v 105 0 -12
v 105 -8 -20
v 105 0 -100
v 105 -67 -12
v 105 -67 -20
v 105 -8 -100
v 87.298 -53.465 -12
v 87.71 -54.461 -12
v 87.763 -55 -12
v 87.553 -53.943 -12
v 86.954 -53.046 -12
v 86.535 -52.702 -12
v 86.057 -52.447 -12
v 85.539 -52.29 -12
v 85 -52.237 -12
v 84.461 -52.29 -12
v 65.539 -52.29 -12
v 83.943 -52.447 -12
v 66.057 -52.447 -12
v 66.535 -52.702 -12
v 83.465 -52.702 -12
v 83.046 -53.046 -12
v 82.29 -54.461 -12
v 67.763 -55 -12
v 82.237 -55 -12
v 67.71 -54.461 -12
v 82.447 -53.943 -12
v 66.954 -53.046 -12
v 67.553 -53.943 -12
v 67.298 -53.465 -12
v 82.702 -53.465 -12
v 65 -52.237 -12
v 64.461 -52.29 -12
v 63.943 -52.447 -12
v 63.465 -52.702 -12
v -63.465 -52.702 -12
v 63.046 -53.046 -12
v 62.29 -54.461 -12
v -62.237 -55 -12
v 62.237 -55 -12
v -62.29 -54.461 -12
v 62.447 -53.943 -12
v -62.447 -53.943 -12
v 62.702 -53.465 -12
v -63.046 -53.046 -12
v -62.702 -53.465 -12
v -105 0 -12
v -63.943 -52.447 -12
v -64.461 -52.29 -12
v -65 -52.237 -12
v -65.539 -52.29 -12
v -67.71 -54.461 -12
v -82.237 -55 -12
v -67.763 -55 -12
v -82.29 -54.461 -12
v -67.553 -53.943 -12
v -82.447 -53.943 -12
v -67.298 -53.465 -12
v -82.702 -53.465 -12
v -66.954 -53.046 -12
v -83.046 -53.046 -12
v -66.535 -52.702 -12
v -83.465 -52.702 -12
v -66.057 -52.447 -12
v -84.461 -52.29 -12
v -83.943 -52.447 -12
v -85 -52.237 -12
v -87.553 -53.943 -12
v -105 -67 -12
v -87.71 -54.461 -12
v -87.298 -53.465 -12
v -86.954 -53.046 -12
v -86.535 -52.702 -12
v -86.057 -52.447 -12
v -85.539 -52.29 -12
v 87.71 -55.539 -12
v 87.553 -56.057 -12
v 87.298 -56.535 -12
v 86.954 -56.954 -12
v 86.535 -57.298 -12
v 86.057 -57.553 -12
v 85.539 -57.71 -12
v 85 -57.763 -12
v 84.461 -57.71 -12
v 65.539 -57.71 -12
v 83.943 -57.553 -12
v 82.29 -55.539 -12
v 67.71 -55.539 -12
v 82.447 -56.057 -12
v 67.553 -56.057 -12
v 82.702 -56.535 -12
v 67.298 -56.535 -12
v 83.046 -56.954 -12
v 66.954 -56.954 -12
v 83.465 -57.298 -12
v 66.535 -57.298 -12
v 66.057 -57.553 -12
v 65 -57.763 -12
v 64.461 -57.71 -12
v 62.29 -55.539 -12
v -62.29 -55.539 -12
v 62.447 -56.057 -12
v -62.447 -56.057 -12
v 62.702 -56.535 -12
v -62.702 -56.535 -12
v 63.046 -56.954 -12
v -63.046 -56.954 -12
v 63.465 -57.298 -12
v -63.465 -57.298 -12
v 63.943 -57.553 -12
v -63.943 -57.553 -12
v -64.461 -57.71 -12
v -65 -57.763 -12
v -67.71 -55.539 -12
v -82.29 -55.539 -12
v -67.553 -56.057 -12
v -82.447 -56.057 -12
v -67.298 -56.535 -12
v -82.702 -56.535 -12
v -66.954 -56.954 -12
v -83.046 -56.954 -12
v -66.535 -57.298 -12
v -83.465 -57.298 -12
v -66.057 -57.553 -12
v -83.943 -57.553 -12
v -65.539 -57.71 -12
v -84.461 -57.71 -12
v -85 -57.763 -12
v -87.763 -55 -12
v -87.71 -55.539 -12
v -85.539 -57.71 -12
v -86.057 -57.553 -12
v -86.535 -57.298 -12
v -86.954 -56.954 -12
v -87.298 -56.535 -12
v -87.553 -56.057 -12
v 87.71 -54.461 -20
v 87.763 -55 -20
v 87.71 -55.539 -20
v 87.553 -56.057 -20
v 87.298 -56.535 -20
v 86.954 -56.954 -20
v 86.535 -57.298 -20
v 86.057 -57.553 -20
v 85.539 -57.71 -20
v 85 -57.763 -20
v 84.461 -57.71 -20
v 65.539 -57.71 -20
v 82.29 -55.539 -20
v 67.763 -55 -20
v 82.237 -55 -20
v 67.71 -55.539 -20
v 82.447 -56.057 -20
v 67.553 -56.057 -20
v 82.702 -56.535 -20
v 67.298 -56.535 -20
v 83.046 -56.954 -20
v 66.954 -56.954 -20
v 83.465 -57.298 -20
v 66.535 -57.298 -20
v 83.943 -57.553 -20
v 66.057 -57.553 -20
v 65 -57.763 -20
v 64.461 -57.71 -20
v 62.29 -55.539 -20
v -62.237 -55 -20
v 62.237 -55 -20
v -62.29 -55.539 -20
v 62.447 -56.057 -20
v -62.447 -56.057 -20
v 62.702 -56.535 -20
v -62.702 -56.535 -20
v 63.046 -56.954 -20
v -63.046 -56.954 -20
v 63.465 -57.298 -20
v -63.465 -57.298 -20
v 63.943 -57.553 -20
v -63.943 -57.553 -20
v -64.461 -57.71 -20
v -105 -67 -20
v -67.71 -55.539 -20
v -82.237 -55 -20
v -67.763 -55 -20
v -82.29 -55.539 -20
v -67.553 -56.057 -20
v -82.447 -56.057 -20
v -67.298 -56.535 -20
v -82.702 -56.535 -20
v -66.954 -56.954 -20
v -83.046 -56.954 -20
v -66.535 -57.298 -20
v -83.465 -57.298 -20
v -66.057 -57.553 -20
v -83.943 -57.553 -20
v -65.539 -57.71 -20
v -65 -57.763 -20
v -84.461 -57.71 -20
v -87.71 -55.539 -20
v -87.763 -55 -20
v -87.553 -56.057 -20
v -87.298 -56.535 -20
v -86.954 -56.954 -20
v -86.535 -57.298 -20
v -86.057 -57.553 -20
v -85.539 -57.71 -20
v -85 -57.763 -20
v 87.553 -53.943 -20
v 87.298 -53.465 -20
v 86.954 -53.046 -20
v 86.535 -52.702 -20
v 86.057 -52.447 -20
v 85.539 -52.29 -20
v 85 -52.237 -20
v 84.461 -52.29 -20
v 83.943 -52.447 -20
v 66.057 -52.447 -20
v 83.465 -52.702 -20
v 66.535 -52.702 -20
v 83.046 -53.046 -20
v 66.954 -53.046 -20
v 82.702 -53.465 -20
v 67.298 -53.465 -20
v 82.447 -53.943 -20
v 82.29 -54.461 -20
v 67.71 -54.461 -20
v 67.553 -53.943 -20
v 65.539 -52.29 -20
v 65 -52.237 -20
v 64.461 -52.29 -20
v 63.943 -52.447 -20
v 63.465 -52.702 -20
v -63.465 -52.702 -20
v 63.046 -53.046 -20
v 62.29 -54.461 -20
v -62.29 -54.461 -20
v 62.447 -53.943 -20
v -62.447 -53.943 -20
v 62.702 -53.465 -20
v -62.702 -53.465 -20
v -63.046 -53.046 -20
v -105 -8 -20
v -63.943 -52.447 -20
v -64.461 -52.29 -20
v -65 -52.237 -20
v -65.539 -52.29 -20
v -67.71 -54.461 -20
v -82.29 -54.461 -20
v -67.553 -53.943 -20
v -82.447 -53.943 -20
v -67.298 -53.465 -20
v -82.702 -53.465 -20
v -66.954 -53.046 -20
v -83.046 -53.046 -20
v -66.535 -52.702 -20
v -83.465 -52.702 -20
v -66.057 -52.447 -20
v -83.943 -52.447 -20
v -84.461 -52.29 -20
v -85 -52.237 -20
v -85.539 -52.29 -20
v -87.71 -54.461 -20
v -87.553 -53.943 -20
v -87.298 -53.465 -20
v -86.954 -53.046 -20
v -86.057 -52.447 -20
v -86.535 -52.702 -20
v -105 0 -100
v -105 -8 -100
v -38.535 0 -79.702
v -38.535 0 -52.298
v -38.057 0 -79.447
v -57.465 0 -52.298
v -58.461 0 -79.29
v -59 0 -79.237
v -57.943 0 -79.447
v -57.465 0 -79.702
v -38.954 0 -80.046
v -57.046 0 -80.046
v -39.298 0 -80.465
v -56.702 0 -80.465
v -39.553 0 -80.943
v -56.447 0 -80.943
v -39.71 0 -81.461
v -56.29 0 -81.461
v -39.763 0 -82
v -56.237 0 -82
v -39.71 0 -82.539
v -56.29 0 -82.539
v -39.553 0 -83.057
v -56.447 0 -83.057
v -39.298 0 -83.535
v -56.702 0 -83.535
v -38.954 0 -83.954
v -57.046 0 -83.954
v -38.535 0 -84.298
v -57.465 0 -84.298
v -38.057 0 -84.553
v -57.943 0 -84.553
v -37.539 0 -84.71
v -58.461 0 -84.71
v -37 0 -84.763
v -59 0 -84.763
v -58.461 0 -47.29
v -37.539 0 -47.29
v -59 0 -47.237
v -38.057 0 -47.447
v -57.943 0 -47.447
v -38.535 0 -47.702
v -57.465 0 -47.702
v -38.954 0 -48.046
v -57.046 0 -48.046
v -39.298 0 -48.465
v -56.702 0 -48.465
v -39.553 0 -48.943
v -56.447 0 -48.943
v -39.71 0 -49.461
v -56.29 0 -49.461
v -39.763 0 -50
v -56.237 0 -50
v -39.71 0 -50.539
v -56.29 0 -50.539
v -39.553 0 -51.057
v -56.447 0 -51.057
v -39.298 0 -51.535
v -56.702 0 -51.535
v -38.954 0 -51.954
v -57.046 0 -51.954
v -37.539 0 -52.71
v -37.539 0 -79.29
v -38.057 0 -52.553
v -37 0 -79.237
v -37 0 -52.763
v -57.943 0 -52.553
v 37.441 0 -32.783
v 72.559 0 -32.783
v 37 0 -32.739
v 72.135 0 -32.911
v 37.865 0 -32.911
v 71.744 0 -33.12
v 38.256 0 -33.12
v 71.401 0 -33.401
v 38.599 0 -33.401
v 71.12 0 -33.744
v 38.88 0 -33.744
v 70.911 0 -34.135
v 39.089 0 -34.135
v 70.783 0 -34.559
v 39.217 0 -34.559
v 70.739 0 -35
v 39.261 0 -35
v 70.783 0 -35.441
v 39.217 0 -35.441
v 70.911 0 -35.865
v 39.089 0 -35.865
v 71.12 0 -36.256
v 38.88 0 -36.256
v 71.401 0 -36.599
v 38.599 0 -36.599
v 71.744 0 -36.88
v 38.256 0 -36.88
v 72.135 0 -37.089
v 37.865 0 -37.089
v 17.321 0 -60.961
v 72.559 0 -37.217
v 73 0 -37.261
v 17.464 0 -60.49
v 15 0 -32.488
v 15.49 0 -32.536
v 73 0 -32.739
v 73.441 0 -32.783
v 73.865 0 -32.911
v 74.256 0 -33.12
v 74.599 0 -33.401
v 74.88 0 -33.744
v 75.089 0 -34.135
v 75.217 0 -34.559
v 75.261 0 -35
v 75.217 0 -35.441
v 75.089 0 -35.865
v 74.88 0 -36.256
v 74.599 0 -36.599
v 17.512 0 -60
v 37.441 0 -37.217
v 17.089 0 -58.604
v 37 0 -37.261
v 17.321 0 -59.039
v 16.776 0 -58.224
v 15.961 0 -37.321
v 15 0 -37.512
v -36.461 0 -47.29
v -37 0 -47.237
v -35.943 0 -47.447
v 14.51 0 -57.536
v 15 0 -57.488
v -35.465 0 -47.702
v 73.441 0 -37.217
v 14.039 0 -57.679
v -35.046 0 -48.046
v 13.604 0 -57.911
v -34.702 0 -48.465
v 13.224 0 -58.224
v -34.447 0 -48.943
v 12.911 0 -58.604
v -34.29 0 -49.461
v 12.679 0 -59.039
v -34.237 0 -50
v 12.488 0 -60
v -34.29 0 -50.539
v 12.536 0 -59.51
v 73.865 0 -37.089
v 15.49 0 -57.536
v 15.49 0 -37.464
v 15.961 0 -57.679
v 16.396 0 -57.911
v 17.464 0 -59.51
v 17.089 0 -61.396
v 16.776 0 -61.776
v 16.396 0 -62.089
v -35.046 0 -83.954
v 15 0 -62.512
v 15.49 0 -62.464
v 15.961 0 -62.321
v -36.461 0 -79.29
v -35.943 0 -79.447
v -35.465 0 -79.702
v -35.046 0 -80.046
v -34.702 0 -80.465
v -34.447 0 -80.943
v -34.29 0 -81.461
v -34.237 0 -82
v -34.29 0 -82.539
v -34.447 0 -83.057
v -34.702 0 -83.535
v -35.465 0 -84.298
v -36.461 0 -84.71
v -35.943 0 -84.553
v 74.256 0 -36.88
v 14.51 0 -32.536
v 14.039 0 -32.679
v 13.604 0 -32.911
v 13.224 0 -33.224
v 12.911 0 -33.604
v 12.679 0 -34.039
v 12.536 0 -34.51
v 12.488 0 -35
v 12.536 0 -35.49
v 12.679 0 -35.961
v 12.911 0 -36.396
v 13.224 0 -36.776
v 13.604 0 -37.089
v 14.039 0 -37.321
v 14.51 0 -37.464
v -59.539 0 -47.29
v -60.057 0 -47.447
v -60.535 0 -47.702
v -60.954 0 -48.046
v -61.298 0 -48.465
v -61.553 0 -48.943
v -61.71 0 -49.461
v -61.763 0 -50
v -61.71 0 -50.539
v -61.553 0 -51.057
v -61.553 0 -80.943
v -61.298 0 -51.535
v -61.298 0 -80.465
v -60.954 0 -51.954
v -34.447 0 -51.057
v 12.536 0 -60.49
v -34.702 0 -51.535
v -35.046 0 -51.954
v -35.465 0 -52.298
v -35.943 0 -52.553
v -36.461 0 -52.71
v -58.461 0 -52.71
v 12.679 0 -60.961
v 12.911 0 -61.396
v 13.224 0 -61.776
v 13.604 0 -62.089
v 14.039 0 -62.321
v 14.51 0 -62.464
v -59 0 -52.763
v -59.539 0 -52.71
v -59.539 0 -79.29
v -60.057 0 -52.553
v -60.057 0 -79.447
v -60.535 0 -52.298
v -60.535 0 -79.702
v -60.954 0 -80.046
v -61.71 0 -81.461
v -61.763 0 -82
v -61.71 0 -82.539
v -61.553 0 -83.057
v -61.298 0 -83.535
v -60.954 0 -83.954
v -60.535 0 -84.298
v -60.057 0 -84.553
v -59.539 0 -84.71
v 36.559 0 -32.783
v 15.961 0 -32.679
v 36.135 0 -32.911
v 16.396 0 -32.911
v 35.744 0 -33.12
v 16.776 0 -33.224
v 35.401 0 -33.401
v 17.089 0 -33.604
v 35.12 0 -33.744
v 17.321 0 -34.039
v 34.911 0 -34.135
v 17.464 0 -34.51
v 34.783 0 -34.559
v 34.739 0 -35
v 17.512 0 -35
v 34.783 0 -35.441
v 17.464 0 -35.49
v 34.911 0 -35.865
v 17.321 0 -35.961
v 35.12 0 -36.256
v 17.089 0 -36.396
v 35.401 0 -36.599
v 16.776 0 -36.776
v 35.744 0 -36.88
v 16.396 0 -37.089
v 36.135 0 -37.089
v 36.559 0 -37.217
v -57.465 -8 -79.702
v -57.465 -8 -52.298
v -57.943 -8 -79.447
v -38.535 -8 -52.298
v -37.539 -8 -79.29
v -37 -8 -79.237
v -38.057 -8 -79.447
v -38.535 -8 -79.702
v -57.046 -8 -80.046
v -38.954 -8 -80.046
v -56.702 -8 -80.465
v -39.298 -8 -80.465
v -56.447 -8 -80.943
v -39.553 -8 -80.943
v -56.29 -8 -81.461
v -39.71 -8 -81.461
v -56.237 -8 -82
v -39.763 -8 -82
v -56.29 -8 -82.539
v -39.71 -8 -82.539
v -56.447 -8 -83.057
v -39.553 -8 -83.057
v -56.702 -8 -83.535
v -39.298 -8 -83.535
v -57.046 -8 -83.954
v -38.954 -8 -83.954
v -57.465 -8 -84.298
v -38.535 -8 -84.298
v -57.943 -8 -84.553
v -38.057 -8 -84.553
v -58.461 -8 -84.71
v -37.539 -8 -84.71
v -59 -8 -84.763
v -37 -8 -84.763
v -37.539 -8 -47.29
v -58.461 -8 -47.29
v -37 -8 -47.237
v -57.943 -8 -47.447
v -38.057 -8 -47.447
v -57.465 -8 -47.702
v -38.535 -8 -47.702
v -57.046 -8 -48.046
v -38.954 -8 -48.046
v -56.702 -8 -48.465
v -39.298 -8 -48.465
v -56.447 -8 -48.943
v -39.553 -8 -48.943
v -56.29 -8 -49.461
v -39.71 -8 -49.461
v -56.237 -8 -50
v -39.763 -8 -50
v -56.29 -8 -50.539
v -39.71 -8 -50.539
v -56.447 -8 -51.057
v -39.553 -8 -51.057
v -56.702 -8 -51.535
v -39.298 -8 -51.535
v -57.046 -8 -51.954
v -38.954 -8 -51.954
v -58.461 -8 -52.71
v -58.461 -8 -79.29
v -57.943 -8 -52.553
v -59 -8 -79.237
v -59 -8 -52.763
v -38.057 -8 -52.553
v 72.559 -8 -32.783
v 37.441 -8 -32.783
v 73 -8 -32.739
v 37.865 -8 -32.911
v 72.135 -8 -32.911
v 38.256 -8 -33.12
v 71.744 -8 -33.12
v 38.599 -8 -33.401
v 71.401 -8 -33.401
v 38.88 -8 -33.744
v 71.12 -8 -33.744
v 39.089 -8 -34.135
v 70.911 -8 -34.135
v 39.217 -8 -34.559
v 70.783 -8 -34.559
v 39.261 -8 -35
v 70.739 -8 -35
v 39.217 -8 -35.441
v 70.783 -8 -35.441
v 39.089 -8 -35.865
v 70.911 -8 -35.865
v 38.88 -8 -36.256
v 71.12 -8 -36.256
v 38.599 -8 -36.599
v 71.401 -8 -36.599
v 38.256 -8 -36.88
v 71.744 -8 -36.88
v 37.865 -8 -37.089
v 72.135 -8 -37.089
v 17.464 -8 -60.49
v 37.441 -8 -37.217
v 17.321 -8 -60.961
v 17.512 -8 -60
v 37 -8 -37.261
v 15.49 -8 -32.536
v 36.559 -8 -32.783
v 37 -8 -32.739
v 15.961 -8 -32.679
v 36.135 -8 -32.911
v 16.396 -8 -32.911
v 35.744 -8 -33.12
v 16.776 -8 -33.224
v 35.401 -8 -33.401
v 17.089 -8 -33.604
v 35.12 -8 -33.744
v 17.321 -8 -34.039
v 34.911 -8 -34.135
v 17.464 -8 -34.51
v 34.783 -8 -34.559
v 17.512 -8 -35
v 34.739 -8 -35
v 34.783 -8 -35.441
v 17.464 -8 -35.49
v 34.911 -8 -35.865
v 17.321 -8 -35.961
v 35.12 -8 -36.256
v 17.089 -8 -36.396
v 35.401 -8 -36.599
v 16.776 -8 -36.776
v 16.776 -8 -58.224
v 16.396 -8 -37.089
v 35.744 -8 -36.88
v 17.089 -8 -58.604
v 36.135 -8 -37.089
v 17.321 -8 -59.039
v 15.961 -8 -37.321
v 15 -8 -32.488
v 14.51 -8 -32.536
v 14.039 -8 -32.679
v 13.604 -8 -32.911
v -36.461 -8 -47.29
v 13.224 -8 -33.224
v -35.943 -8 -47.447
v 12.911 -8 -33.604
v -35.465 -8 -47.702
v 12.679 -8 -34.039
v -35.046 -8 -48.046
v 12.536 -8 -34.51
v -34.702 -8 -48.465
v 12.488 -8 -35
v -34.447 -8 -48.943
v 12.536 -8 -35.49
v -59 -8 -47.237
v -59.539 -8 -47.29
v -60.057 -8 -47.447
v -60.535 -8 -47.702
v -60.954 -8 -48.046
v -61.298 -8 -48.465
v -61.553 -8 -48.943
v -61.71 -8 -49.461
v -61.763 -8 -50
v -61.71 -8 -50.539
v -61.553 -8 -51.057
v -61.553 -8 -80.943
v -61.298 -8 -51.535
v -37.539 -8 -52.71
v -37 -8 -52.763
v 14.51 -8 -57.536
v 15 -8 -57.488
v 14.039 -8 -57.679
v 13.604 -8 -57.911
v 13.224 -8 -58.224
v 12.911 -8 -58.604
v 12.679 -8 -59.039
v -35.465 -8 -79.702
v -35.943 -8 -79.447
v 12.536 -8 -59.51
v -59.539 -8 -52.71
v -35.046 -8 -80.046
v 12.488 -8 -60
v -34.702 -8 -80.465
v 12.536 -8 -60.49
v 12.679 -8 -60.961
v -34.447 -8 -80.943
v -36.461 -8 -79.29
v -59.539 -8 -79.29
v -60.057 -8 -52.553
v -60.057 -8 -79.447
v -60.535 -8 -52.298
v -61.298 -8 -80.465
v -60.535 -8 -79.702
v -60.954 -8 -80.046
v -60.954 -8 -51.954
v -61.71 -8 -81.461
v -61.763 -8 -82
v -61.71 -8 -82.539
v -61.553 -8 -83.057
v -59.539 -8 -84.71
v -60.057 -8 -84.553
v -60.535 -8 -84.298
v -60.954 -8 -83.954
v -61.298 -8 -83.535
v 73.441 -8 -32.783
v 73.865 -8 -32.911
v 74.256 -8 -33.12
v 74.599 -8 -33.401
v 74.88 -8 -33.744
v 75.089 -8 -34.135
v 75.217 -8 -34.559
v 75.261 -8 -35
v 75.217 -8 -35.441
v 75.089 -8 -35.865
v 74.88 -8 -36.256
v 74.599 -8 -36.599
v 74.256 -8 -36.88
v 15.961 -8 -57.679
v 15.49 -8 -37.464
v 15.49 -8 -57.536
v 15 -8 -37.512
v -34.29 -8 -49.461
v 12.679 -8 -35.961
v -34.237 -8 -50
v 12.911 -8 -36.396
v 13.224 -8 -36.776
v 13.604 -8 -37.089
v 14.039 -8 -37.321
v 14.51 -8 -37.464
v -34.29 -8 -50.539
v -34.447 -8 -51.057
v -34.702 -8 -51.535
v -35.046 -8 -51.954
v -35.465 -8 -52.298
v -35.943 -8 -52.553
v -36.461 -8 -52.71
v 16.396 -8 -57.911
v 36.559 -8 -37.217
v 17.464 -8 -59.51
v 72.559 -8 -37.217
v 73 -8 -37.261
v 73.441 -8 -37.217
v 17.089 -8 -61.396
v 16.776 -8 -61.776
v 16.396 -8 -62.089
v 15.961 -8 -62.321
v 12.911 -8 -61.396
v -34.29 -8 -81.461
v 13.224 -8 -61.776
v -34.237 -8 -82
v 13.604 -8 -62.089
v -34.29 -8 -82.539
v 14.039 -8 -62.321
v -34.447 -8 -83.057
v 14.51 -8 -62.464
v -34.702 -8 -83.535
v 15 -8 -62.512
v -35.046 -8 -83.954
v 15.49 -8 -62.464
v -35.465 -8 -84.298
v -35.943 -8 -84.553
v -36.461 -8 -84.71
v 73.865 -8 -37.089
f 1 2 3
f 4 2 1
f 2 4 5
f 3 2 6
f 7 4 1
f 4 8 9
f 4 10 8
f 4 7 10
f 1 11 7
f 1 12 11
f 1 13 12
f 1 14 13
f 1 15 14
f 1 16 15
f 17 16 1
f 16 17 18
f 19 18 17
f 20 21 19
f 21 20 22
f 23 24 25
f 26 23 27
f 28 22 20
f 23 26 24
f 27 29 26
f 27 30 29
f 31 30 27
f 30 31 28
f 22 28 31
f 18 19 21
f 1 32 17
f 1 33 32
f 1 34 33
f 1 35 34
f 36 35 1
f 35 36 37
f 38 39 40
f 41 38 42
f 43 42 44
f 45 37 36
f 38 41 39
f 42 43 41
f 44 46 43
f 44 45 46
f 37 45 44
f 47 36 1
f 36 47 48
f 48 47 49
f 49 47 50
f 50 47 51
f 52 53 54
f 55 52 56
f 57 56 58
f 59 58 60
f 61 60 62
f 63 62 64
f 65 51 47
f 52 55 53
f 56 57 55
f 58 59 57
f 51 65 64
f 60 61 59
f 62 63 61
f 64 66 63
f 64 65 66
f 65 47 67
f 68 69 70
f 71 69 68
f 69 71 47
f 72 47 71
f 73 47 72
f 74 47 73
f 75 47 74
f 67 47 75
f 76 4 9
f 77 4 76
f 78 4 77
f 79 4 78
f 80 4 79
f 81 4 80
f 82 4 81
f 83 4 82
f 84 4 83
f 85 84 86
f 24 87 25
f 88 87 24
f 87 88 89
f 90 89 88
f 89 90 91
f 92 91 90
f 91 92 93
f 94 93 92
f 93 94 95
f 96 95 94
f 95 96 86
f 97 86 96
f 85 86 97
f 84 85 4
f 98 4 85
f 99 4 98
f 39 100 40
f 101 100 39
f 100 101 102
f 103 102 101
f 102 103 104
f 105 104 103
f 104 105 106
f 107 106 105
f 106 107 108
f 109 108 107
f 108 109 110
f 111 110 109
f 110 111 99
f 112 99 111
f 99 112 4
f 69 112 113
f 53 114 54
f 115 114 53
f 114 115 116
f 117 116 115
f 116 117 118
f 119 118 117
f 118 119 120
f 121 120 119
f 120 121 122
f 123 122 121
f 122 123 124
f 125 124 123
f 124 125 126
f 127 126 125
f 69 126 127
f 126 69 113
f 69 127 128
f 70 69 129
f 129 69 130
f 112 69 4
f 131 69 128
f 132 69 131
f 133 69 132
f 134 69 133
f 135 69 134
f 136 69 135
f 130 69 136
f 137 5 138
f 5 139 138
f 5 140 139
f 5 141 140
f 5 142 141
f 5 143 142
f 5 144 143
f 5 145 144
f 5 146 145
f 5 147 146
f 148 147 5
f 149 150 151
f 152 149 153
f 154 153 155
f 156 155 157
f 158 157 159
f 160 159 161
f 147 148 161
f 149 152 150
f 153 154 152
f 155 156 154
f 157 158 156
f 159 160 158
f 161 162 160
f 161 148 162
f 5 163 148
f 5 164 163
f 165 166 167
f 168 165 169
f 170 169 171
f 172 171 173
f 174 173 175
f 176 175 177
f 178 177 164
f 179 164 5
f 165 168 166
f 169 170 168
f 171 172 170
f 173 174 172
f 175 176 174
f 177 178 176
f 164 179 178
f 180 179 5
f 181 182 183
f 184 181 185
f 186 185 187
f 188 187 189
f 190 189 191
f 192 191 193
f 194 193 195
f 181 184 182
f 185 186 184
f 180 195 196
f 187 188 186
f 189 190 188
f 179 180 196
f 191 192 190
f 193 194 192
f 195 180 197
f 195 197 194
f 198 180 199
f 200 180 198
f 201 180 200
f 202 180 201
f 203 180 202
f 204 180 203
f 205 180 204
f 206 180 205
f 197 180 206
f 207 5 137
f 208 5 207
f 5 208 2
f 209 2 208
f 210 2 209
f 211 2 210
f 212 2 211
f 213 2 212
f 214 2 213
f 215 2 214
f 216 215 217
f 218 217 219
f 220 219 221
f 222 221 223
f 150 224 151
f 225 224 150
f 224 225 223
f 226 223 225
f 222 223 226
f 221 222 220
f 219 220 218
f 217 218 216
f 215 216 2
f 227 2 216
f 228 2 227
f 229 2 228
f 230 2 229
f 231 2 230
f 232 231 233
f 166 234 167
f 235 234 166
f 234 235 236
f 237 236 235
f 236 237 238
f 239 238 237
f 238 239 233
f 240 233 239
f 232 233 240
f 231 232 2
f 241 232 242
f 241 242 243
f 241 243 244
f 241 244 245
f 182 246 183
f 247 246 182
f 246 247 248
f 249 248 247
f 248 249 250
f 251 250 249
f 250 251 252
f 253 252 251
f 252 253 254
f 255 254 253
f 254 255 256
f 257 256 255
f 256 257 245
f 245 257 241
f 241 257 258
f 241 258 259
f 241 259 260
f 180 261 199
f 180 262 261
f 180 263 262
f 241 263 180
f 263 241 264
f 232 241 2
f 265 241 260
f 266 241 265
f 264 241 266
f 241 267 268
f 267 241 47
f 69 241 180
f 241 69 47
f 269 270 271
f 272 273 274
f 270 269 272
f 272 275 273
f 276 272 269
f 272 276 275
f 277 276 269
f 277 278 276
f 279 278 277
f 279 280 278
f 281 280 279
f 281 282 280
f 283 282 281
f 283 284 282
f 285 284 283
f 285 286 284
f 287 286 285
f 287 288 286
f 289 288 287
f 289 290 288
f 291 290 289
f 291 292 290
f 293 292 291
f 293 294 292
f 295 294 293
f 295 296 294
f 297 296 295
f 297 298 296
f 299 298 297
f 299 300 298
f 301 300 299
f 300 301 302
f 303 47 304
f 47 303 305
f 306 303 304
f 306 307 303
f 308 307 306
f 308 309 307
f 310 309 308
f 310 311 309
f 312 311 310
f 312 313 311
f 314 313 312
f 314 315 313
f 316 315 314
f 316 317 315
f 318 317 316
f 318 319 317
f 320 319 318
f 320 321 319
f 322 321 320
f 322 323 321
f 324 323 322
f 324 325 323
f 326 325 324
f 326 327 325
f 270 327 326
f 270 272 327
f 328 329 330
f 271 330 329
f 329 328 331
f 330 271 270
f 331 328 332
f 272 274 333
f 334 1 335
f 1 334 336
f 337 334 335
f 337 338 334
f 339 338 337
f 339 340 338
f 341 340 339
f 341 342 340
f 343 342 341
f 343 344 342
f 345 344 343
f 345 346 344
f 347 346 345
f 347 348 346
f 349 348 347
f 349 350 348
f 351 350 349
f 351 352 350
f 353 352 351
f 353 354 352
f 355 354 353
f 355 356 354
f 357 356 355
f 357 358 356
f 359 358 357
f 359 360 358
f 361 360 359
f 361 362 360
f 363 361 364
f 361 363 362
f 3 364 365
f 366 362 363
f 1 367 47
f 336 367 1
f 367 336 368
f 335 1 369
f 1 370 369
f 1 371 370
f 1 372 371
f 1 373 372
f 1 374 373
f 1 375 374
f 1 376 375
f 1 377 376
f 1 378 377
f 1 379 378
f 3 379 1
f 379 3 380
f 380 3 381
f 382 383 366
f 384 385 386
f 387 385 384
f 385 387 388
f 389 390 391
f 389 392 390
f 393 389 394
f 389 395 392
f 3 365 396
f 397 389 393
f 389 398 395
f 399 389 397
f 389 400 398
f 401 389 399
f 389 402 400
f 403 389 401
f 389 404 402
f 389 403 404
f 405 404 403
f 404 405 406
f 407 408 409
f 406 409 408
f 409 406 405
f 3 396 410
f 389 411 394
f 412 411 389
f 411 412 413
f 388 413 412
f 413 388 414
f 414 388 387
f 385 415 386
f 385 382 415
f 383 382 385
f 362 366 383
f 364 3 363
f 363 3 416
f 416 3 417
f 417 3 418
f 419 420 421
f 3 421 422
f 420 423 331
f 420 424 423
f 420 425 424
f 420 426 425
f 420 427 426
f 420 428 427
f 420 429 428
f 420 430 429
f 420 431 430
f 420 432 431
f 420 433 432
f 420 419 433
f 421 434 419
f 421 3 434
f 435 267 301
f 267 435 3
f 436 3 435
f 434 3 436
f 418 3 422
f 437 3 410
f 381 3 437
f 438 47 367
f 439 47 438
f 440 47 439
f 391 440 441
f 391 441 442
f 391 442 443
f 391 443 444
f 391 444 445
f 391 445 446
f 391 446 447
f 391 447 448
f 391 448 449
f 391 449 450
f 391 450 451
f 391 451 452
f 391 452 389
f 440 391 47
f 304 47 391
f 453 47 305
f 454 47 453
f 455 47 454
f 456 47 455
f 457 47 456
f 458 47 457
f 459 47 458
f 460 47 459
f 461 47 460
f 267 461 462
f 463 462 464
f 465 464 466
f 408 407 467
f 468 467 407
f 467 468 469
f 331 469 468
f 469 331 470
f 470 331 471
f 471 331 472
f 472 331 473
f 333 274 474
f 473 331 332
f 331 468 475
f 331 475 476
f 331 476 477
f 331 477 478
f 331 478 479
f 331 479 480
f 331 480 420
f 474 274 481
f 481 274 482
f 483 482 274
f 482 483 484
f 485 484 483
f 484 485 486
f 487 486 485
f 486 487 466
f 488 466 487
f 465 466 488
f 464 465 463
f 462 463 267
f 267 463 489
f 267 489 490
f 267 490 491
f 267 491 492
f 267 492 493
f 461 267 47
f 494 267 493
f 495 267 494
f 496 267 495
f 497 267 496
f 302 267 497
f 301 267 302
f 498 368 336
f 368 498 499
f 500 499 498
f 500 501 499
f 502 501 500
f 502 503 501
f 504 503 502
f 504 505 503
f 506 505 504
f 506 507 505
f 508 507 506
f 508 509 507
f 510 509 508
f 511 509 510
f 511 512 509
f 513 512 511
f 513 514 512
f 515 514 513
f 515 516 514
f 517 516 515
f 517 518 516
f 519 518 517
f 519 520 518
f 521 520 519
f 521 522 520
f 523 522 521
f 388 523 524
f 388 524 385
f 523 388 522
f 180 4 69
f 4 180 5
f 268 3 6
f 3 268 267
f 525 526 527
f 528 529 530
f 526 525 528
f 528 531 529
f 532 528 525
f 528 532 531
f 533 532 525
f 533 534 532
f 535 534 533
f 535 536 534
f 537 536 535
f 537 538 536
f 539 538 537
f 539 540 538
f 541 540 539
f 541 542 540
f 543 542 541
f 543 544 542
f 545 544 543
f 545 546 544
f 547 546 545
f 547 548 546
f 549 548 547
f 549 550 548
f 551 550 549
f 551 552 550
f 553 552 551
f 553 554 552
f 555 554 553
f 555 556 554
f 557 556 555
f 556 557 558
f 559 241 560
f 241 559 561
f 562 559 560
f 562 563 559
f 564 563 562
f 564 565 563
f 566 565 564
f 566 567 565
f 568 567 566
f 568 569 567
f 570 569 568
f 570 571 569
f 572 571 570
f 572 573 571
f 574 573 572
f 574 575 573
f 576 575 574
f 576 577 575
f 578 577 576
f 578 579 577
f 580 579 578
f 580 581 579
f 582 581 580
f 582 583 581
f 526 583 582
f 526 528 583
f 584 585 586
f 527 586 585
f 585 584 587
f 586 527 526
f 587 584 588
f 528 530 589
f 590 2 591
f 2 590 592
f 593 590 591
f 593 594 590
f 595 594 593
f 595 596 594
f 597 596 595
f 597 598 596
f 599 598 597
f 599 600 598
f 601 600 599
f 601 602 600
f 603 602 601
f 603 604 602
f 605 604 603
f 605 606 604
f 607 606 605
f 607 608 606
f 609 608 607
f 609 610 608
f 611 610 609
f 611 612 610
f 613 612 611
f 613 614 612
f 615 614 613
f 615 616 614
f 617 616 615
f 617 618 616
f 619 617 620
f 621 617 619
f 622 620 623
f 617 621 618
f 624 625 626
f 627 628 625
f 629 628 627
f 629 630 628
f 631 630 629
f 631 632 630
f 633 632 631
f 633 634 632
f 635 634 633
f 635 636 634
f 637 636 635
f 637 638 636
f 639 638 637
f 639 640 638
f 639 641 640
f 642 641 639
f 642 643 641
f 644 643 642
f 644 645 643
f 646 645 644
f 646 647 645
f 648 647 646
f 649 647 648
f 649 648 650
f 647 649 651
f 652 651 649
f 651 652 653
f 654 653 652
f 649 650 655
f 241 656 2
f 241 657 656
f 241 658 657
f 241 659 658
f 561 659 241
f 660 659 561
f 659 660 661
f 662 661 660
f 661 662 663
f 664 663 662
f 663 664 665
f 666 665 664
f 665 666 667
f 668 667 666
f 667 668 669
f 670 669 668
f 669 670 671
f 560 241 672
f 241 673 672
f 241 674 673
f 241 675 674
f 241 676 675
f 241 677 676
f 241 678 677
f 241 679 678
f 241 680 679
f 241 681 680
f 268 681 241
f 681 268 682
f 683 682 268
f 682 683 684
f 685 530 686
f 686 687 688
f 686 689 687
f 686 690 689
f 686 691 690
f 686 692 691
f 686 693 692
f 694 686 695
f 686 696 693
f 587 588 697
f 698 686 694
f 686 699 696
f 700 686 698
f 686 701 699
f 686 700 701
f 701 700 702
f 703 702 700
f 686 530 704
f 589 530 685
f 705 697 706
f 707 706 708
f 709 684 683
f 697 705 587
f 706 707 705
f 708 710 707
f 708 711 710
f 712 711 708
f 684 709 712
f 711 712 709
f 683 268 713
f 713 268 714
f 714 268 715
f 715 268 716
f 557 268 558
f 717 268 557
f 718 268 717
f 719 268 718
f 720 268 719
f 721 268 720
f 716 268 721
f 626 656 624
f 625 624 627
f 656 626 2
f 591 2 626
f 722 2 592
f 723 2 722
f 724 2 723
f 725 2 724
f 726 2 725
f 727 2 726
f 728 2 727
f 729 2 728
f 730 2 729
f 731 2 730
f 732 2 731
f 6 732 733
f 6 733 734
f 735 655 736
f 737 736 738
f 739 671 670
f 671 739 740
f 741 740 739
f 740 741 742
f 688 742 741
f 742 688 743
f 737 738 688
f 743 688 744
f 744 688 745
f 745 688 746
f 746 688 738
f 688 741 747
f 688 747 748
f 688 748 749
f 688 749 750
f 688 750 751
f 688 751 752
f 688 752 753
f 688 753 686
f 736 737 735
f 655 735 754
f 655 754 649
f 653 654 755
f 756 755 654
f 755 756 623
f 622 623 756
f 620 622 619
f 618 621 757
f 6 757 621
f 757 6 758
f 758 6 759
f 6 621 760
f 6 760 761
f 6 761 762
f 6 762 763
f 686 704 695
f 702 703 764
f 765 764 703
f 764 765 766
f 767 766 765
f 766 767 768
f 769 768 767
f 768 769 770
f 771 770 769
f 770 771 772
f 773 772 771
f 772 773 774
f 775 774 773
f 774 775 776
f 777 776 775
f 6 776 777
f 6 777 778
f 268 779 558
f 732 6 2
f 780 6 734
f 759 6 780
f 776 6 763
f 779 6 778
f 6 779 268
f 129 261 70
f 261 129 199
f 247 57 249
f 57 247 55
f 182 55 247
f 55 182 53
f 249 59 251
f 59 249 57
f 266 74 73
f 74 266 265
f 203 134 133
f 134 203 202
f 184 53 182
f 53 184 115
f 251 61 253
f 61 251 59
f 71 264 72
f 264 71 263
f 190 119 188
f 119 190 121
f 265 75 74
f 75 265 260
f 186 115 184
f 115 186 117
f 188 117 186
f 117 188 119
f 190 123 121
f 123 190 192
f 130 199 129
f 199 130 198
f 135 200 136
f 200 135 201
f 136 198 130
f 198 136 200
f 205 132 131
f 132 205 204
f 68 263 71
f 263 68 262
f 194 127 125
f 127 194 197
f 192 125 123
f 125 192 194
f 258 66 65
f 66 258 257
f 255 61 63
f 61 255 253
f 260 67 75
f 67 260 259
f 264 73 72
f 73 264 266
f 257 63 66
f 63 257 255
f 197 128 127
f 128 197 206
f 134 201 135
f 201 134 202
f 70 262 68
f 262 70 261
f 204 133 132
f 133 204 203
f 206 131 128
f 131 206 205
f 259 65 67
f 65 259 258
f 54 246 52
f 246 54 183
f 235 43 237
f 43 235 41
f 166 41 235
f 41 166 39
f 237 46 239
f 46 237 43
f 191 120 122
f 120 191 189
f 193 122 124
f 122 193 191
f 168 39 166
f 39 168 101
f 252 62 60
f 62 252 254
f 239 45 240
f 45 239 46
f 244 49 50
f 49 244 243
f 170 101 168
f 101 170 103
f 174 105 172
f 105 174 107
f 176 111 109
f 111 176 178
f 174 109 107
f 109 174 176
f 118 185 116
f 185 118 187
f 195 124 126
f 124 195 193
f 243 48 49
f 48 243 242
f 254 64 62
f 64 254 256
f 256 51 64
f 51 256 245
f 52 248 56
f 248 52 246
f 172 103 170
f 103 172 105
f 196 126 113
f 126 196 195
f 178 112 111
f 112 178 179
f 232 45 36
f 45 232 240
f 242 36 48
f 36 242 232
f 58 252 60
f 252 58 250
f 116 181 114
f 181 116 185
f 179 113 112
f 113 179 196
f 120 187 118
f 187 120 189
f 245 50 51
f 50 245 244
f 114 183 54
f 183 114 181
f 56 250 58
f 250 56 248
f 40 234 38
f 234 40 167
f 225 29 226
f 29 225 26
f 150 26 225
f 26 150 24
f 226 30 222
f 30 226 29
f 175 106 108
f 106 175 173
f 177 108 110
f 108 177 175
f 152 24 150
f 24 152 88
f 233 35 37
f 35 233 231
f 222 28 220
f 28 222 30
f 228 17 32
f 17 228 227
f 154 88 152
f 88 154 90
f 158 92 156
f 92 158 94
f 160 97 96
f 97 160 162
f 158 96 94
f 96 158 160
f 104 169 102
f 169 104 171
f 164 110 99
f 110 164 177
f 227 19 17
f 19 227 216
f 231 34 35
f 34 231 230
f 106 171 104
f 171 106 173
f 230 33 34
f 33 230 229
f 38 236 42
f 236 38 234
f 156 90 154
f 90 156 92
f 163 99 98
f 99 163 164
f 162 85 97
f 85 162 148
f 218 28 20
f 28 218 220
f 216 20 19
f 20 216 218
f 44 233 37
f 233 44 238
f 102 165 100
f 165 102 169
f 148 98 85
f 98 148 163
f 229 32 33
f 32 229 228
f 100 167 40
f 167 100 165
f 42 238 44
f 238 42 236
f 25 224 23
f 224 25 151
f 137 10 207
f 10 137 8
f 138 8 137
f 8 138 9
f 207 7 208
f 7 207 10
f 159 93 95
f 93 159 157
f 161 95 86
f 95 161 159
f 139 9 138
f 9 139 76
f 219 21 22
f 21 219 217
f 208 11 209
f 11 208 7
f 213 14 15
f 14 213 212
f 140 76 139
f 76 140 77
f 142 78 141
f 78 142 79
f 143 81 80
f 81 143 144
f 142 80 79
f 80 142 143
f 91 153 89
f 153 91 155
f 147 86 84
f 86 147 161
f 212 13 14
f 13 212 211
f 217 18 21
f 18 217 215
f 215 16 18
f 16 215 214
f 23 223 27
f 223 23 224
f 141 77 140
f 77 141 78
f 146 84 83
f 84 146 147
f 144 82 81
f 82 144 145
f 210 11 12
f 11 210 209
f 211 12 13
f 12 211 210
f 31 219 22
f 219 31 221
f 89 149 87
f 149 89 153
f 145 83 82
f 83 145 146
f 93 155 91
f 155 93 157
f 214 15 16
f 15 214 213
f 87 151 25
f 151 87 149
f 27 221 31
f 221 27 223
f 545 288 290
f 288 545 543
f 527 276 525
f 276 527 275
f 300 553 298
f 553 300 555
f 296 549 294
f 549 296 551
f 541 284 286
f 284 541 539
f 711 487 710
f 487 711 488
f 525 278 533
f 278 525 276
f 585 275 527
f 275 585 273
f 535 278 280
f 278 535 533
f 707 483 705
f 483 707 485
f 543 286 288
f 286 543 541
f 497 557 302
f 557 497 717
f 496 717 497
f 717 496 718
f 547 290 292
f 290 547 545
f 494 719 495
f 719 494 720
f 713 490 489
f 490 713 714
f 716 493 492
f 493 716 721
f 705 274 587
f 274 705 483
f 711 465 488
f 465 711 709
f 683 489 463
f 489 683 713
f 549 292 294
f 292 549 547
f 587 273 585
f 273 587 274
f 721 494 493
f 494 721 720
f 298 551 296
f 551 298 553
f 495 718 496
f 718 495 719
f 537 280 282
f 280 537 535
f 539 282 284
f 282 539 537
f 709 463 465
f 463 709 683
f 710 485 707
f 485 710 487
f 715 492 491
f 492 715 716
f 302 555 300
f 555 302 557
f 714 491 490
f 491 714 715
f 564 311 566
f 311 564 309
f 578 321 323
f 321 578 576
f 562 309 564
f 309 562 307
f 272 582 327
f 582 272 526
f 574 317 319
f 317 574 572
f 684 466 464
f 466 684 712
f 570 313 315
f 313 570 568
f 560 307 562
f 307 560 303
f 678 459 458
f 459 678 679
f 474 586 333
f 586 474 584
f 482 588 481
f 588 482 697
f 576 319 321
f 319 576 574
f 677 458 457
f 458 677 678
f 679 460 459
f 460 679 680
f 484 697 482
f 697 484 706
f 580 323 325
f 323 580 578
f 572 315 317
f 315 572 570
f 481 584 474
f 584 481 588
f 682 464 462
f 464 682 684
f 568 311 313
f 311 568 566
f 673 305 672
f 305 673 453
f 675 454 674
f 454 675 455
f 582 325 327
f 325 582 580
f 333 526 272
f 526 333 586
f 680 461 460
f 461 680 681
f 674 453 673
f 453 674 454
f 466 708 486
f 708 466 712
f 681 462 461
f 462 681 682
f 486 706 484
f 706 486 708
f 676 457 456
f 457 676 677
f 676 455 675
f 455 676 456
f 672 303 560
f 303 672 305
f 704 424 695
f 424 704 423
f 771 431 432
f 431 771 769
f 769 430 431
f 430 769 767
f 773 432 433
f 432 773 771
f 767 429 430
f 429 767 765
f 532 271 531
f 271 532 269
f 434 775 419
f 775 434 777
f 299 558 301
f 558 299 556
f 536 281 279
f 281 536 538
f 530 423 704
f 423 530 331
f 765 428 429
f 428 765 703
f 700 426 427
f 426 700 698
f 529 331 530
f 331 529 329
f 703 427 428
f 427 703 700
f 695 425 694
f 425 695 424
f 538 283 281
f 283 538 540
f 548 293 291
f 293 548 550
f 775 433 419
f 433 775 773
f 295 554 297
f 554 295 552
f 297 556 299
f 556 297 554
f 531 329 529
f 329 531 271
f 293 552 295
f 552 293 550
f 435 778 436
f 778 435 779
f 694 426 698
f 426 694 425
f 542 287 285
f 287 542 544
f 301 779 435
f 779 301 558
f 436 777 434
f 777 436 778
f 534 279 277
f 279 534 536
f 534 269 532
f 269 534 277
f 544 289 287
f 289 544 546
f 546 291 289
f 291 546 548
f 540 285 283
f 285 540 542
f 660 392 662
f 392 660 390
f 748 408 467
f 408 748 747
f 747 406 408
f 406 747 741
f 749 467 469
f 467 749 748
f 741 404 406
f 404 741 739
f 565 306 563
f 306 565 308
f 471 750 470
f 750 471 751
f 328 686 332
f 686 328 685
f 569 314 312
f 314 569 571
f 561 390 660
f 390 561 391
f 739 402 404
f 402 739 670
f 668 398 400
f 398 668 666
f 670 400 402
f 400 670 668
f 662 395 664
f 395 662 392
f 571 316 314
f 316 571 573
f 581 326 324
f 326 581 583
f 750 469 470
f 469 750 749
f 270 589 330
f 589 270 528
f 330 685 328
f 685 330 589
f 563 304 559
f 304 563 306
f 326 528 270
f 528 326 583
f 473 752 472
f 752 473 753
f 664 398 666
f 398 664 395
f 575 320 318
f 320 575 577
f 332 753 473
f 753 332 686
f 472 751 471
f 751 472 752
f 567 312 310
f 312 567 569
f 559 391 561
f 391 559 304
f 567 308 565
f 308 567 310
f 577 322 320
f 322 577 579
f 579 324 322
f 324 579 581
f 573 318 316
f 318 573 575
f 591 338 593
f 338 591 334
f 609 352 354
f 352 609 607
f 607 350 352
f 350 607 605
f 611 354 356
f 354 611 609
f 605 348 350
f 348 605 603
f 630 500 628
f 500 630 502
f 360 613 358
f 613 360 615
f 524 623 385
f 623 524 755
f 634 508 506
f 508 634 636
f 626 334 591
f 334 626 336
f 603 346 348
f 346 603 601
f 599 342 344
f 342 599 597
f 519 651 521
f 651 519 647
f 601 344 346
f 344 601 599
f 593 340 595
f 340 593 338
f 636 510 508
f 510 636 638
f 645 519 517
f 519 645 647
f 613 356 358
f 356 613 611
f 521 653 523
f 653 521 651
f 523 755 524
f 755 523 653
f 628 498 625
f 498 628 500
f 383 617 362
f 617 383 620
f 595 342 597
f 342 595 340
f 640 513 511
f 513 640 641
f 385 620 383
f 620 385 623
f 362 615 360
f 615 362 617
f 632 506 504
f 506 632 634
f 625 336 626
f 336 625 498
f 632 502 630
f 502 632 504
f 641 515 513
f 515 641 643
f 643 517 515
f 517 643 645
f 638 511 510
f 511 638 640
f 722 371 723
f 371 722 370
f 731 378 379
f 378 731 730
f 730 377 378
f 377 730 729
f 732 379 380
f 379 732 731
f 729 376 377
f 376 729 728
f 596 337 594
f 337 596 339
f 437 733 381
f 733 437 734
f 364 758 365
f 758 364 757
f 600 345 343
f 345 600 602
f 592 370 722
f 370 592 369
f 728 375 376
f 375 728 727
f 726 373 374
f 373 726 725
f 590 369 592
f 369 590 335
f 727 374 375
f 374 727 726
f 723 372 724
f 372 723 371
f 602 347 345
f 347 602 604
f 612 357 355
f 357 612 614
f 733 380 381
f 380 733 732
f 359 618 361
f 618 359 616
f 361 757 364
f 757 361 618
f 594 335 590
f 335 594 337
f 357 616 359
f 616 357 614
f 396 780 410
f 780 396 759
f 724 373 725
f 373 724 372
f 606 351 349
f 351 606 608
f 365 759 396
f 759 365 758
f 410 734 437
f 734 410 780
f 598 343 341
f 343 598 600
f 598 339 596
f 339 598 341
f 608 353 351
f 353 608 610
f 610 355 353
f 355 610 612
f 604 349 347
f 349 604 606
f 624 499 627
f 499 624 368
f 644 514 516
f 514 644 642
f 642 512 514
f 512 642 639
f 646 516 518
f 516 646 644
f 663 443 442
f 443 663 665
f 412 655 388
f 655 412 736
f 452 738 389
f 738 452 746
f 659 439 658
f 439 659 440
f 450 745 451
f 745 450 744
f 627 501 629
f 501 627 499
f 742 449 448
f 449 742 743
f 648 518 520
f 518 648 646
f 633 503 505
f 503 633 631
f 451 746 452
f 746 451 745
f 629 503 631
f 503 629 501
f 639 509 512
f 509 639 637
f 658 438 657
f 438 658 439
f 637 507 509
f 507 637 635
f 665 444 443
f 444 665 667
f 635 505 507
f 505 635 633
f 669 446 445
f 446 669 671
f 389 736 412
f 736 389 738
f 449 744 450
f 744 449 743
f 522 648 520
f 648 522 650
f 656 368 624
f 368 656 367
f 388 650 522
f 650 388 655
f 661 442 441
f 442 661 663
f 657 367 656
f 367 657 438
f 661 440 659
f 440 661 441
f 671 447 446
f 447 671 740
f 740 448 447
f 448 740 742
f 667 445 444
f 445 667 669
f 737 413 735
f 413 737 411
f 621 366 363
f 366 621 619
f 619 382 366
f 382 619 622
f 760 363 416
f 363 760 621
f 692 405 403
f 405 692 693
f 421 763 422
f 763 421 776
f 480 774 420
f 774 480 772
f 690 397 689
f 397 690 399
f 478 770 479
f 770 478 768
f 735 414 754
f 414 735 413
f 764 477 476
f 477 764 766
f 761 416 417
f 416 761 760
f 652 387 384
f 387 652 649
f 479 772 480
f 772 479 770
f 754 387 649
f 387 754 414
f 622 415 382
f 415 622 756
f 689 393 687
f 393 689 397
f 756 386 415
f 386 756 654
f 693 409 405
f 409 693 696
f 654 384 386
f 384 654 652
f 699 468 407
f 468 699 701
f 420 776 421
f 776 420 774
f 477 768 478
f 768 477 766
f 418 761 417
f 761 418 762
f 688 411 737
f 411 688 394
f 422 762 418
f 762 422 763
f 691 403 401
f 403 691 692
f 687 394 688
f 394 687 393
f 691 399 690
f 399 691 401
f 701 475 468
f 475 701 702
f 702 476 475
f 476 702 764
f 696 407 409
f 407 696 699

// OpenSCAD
// Compact L carrier: horizontal flange meets frame Z=-12; mounting face Y=0.
width=210; wall=8; rear_y=-67; top_z=-12; bottom_z=-100;
camera_x=-48; camera_z=-66; camera_pitch=[22,32];
td_x=55; td_z=-35; td_bolt_pitch=36;
frame_x=[-85,-65,65,85];
$fn=48;
module hole(d,h){cylinder(d=d/cos(180/32),h=h,$fn=32);}
module yh(d,h){rotate([-90,0,0])hole(d,h);}
assert(camera_z+camera_pitch[1]/2+5<top_z);
assert(camera_z-camera_pitch[1]/2-5>bottom_z);
assert(td_x+td_bolt_pitch/2+5<width/2);
difference(){
 union(){
  translate([-width/2,rear_y,top_z-wall])cube([width,-rear_y,wall]);
  translate([-width/2,-wall,bottom_z])cube([width,wall,top_z-bottom_z]);
 }
 for(x=frame_x)translate([x,-55,top_z-wall-.02])hole(5.5,wall+.04);
 for(x=[-camera_pitch[0]/2,camera_pitch[0]/2],z=[-camera_pitch[1]/2,camera_pitch[1]/2])
  translate([camera_x+x,-wall-.02,camera_z+z])yh(5.5,wall+.04);
 for(x=[-td_bolt_pitch/2,td_bolt_pitch/2])translate([td_x+x,-wall-.02,td_z])yh(4.5,wall+.04);
 // Open routing around side; these are lacing eyes, not connector pass-throughs.
 for(z=[-35,-60])translate([15,-wall-.02,z])yh(5,wall+.04);
}
